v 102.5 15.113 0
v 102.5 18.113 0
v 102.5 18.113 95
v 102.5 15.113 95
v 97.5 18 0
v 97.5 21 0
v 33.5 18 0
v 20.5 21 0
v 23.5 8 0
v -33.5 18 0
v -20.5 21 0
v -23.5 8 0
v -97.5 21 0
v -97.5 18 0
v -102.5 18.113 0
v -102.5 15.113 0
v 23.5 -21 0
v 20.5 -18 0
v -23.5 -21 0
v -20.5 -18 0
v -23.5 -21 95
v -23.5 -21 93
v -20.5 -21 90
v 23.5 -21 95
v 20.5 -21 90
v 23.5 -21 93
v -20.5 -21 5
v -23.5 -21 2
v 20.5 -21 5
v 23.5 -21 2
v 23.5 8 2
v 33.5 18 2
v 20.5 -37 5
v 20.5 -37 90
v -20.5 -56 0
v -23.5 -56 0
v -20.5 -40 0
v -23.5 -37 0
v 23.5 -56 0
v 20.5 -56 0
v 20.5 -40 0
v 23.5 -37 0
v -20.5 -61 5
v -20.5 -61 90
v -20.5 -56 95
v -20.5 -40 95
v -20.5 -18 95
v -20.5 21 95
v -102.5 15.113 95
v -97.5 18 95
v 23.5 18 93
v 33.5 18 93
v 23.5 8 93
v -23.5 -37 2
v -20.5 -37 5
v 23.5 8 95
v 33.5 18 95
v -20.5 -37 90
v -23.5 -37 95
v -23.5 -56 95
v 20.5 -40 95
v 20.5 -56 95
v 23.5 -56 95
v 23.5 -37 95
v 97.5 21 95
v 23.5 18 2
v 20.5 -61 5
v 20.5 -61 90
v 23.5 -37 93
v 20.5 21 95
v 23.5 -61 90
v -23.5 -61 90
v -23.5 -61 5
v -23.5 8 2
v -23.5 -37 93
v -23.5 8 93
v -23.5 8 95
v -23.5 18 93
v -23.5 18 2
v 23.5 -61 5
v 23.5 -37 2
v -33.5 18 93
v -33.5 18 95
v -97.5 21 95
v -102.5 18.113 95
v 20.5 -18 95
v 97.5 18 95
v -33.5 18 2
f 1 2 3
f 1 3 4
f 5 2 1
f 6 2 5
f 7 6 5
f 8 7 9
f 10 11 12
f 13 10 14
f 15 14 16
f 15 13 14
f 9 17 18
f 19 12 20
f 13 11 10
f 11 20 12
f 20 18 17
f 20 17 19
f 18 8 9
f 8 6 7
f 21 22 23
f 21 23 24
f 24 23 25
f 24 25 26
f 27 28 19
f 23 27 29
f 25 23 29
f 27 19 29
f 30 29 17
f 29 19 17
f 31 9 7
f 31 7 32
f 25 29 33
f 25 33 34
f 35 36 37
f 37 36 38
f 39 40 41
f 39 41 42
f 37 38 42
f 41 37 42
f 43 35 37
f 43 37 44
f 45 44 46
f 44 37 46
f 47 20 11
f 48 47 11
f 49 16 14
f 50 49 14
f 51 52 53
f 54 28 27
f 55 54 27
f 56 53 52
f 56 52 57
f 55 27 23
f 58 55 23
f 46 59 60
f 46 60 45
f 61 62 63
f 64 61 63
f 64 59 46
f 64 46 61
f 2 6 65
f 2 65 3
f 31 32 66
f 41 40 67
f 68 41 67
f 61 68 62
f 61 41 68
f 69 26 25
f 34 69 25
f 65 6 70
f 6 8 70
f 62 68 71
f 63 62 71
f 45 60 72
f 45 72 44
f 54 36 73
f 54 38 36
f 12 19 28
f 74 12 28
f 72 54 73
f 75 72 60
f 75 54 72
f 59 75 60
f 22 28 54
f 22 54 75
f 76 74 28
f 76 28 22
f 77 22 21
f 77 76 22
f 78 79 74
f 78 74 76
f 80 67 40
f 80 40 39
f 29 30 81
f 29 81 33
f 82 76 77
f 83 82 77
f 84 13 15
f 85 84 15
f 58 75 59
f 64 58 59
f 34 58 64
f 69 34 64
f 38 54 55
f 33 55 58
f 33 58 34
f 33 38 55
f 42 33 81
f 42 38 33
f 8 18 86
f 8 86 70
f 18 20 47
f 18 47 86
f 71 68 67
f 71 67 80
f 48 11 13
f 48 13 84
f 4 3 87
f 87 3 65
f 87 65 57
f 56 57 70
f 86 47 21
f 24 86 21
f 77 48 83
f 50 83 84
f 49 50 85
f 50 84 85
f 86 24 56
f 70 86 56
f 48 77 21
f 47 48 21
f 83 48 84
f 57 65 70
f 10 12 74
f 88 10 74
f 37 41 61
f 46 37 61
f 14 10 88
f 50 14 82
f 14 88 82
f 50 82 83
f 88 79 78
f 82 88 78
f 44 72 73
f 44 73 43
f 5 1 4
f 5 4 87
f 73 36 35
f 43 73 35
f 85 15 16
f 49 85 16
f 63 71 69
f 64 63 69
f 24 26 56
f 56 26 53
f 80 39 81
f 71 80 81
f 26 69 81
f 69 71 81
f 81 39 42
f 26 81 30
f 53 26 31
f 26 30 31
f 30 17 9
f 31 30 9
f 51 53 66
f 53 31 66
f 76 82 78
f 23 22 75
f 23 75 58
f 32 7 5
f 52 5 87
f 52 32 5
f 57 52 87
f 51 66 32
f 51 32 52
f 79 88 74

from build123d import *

# Parameters (mm, degrees)
SKETCH1_W                = 47
SKETCH1_H                = 42
BOSS_EXTRUDE1_DEPTH      = 95
SHELL1_T                 = -3
SKETCH2_W                = 95
SKETCH2_H                = 3
BOSS_EXTRUDE2_DEPTH      = 74
SKETCH3_W                = 3
SKETCH3_H                = 95
BOSS_EXTRUDE3_DEPTH      = 40
SKETCH4_W                = 95
SKETCH4_H                = 3
BOSS_EXTRUDE4_DEPTH      = 41
CHAMFER2_SIZE            = 5
CHAMFER3_SIZE            = 5
BOSS_EXTRUDE5_DEPTH      = 95
SKETCH10_W               = 10
SKETCH10_H               = 2
BOSS_EXTRUDE7_DEPTH      = 10
CHAMFER5_SIZE            = 10
CHAMFER5_OF_MIRROR5_SIZE = 10


# Some blends are built 0.0001 mm under size
with BuildPart() as part:
    # Sketch1 → Boss-Extrude1 (new body)
    with BuildSketch(Plane.XY):
        Rectangle(SKETCH1_W, SKETCH1_H)
    extrude(amount=BOSS_EXTRUDE1_DEPTH)

    # Shell1
    shell1_openings = [part.faces().sort_by_distance(p)[0] for p in [
        (0, 0, 95),
        (0, 0, 0),
        (0, 21, 47.5),
    ]]
    offset(amount=SHELL1_T, openings=shell1_openings, kind=Kind.INTERSECTION)

    # Sketch2 → Boss-Extrude2 (add)
    with BuildSketch(Plane.ZY.offset(23.5)):
        with Locations((47.5, 19.5)):
            Rectangle(SKETCH2_W, SKETCH2_H)
    boss_extrude2 = extrude(amount=BOSS_EXTRUDE2_DEPTH)

    # Mirror1: Boss-Extrude2 across plane
    add(boss_extrude2.mirror(Plane(origin=(0, 0, 0), x_dir=(0, 0, 1), z_dir=(1, 0, 0))))

    # Sketch3 → Boss-Extrude3 (add)
    with BuildSketch(Plane.XZ.offset(21)):
        with Locations((-22, 47.5)):
            Rectangle(SKETCH3_W, SKETCH3_H)
        with Locations((22, 47.5)):
            Rectangle(SKETCH3_W, SKETCH3_H)
    extrude(amount=BOSS_EXTRUDE3_DEPTH)

    # Sketch4 → Boss-Extrude4 (add)
    with BuildSketch(Plane.ZY.offset(-20.5)):
        with Locations((47.5, -38.5)):
            Rectangle(SKETCH4_W, SKETCH4_H)
    extrude(amount=BOSS_EXTRUDE4_DEPTH)

    # Chamfer2
    chamfer2_edges = [part.edges().sort_by_distance(p)[0] for p in [
        (-22, -61, 0),
        (-22, -61, 95),
        (22, -61, 95),
        (22, -61, 0),
    ]]
    chamfer(chamfer2_edges, length=CHAMFER2_SIZE)

    # Chamfer3
    # the kernel refuses this chamfer: 5 mm, written as the material it takes off along each edge
    with BuildSketch(Plane(origin=(-20.5, -21, 95), x_dir=(-0.9996219169112968, 0, 0.0274958766105877), z_dir=(0, -1, 0)), Plane(origin=(20.5, -21, 0), x_dir=(0.9996219169112968, 0, -0.027495876610586372), z_dir=(0, -1, 0))) as chamfer3_piece_1:
        Polygon((CHAMFER3_SIZE * 0.999621916911, CHAMFER3_SIZE * 0.0274958766106), (-CHAMFER3_SIZE * 0.0274958766106, CHAMFER3_SIZE * 0.999621916911), (0, 0), align=None)
    extrude(amount=16, mode=Mode.SUBTRACT)
    with BuildSketch(Plane(origin=(-20.5, -21, 0), x_dir=(-0.9996219169112968, 0, -0.027495876610586372), z_dir=(0, -1, 0)), Plane(origin=(20.5, -21, 95), x_dir=(0.9996219169112968, 0, 0.0274958766105877), z_dir=(0, -1, 0))) as chamfer3_piece_2:
        Polygon((CHAMFER3_SIZE * 0.999621916911, -CHAMFER3_SIZE * 0.0274958766106), (-CHAMFER3_SIZE * 0.0274958766106, -CHAMFER3_SIZE * 0.999621916911), (0, 0), align=None)
    extrude(amount=16, mode=Mode.SUBTRACT)

    # Sketch5 → Boss-Extrude5 (add)
    with BuildSketch(Plane(origin=(0, 0, 0), x_dir=(-1, 0, 0), z_dir=(0, 0, -1))):
        Polygon((97.5, 18), (97.5, 21), (102.5, 18.113248654), (102.5, 15.113248654), align=None)
    boss_extrude5 = extrude(amount=-BOSS_EXTRUDE5_DEPTH)

    # Mirror2: Boss-Extrude5 across plane
    add(boss_extrude5.mirror(Plane(origin=(0, 0, 0), x_dir=(0, 0, 1), z_dir=(1, 0, 0))))

    # Sketch10 → Boss-Extrude7 (add)
    with BuildSketch(Plane.XZ.offset(-18)):
        with Locations((-28.5, 94)):
            Rectangle(SKETCH10_W, SKETCH10_H)
        with Locations((-28.5, 1)):
            Rectangle(SKETCH10_W, SKETCH10_H)
    boss_extrude7 = extrude(amount=BOSS_EXTRUDE7_DEPTH)

    # Chamfer5
    chamfer5_edges = [part.edges().sort_by_distance(p)[0] for p in [
        (-33.5, 8, 94),
        (-33.5, 8, 1),
    ]]
    chamfer(chamfer5_edges, length=CHAMFER5_SIZE - 0.0001)  # a hair under: the kernel refuses the full size

    # Mirror5: Boss-Extrude7 across plane
    add(boss_extrude7.mirror(Plane(origin=(0, 0, 0), x_dir=(0, 0, 1), z_dir=(1, 0, 0))))

    # Chamfer5 of Mirror5
    chamfer5_of_mirror5_edges = [part.edges().sort_by_distance(p)[0] for p in [
        (33.5, 8, 94),
        (33.5, 8, 1),
    ]]
    chamfer(chamfer5_of_mirror5_edges, length=CHAMFER5_OF_MIRROR5_SIZE - 0.0001)  # a hair under: the kernel refuses the full size


solid = part.part
